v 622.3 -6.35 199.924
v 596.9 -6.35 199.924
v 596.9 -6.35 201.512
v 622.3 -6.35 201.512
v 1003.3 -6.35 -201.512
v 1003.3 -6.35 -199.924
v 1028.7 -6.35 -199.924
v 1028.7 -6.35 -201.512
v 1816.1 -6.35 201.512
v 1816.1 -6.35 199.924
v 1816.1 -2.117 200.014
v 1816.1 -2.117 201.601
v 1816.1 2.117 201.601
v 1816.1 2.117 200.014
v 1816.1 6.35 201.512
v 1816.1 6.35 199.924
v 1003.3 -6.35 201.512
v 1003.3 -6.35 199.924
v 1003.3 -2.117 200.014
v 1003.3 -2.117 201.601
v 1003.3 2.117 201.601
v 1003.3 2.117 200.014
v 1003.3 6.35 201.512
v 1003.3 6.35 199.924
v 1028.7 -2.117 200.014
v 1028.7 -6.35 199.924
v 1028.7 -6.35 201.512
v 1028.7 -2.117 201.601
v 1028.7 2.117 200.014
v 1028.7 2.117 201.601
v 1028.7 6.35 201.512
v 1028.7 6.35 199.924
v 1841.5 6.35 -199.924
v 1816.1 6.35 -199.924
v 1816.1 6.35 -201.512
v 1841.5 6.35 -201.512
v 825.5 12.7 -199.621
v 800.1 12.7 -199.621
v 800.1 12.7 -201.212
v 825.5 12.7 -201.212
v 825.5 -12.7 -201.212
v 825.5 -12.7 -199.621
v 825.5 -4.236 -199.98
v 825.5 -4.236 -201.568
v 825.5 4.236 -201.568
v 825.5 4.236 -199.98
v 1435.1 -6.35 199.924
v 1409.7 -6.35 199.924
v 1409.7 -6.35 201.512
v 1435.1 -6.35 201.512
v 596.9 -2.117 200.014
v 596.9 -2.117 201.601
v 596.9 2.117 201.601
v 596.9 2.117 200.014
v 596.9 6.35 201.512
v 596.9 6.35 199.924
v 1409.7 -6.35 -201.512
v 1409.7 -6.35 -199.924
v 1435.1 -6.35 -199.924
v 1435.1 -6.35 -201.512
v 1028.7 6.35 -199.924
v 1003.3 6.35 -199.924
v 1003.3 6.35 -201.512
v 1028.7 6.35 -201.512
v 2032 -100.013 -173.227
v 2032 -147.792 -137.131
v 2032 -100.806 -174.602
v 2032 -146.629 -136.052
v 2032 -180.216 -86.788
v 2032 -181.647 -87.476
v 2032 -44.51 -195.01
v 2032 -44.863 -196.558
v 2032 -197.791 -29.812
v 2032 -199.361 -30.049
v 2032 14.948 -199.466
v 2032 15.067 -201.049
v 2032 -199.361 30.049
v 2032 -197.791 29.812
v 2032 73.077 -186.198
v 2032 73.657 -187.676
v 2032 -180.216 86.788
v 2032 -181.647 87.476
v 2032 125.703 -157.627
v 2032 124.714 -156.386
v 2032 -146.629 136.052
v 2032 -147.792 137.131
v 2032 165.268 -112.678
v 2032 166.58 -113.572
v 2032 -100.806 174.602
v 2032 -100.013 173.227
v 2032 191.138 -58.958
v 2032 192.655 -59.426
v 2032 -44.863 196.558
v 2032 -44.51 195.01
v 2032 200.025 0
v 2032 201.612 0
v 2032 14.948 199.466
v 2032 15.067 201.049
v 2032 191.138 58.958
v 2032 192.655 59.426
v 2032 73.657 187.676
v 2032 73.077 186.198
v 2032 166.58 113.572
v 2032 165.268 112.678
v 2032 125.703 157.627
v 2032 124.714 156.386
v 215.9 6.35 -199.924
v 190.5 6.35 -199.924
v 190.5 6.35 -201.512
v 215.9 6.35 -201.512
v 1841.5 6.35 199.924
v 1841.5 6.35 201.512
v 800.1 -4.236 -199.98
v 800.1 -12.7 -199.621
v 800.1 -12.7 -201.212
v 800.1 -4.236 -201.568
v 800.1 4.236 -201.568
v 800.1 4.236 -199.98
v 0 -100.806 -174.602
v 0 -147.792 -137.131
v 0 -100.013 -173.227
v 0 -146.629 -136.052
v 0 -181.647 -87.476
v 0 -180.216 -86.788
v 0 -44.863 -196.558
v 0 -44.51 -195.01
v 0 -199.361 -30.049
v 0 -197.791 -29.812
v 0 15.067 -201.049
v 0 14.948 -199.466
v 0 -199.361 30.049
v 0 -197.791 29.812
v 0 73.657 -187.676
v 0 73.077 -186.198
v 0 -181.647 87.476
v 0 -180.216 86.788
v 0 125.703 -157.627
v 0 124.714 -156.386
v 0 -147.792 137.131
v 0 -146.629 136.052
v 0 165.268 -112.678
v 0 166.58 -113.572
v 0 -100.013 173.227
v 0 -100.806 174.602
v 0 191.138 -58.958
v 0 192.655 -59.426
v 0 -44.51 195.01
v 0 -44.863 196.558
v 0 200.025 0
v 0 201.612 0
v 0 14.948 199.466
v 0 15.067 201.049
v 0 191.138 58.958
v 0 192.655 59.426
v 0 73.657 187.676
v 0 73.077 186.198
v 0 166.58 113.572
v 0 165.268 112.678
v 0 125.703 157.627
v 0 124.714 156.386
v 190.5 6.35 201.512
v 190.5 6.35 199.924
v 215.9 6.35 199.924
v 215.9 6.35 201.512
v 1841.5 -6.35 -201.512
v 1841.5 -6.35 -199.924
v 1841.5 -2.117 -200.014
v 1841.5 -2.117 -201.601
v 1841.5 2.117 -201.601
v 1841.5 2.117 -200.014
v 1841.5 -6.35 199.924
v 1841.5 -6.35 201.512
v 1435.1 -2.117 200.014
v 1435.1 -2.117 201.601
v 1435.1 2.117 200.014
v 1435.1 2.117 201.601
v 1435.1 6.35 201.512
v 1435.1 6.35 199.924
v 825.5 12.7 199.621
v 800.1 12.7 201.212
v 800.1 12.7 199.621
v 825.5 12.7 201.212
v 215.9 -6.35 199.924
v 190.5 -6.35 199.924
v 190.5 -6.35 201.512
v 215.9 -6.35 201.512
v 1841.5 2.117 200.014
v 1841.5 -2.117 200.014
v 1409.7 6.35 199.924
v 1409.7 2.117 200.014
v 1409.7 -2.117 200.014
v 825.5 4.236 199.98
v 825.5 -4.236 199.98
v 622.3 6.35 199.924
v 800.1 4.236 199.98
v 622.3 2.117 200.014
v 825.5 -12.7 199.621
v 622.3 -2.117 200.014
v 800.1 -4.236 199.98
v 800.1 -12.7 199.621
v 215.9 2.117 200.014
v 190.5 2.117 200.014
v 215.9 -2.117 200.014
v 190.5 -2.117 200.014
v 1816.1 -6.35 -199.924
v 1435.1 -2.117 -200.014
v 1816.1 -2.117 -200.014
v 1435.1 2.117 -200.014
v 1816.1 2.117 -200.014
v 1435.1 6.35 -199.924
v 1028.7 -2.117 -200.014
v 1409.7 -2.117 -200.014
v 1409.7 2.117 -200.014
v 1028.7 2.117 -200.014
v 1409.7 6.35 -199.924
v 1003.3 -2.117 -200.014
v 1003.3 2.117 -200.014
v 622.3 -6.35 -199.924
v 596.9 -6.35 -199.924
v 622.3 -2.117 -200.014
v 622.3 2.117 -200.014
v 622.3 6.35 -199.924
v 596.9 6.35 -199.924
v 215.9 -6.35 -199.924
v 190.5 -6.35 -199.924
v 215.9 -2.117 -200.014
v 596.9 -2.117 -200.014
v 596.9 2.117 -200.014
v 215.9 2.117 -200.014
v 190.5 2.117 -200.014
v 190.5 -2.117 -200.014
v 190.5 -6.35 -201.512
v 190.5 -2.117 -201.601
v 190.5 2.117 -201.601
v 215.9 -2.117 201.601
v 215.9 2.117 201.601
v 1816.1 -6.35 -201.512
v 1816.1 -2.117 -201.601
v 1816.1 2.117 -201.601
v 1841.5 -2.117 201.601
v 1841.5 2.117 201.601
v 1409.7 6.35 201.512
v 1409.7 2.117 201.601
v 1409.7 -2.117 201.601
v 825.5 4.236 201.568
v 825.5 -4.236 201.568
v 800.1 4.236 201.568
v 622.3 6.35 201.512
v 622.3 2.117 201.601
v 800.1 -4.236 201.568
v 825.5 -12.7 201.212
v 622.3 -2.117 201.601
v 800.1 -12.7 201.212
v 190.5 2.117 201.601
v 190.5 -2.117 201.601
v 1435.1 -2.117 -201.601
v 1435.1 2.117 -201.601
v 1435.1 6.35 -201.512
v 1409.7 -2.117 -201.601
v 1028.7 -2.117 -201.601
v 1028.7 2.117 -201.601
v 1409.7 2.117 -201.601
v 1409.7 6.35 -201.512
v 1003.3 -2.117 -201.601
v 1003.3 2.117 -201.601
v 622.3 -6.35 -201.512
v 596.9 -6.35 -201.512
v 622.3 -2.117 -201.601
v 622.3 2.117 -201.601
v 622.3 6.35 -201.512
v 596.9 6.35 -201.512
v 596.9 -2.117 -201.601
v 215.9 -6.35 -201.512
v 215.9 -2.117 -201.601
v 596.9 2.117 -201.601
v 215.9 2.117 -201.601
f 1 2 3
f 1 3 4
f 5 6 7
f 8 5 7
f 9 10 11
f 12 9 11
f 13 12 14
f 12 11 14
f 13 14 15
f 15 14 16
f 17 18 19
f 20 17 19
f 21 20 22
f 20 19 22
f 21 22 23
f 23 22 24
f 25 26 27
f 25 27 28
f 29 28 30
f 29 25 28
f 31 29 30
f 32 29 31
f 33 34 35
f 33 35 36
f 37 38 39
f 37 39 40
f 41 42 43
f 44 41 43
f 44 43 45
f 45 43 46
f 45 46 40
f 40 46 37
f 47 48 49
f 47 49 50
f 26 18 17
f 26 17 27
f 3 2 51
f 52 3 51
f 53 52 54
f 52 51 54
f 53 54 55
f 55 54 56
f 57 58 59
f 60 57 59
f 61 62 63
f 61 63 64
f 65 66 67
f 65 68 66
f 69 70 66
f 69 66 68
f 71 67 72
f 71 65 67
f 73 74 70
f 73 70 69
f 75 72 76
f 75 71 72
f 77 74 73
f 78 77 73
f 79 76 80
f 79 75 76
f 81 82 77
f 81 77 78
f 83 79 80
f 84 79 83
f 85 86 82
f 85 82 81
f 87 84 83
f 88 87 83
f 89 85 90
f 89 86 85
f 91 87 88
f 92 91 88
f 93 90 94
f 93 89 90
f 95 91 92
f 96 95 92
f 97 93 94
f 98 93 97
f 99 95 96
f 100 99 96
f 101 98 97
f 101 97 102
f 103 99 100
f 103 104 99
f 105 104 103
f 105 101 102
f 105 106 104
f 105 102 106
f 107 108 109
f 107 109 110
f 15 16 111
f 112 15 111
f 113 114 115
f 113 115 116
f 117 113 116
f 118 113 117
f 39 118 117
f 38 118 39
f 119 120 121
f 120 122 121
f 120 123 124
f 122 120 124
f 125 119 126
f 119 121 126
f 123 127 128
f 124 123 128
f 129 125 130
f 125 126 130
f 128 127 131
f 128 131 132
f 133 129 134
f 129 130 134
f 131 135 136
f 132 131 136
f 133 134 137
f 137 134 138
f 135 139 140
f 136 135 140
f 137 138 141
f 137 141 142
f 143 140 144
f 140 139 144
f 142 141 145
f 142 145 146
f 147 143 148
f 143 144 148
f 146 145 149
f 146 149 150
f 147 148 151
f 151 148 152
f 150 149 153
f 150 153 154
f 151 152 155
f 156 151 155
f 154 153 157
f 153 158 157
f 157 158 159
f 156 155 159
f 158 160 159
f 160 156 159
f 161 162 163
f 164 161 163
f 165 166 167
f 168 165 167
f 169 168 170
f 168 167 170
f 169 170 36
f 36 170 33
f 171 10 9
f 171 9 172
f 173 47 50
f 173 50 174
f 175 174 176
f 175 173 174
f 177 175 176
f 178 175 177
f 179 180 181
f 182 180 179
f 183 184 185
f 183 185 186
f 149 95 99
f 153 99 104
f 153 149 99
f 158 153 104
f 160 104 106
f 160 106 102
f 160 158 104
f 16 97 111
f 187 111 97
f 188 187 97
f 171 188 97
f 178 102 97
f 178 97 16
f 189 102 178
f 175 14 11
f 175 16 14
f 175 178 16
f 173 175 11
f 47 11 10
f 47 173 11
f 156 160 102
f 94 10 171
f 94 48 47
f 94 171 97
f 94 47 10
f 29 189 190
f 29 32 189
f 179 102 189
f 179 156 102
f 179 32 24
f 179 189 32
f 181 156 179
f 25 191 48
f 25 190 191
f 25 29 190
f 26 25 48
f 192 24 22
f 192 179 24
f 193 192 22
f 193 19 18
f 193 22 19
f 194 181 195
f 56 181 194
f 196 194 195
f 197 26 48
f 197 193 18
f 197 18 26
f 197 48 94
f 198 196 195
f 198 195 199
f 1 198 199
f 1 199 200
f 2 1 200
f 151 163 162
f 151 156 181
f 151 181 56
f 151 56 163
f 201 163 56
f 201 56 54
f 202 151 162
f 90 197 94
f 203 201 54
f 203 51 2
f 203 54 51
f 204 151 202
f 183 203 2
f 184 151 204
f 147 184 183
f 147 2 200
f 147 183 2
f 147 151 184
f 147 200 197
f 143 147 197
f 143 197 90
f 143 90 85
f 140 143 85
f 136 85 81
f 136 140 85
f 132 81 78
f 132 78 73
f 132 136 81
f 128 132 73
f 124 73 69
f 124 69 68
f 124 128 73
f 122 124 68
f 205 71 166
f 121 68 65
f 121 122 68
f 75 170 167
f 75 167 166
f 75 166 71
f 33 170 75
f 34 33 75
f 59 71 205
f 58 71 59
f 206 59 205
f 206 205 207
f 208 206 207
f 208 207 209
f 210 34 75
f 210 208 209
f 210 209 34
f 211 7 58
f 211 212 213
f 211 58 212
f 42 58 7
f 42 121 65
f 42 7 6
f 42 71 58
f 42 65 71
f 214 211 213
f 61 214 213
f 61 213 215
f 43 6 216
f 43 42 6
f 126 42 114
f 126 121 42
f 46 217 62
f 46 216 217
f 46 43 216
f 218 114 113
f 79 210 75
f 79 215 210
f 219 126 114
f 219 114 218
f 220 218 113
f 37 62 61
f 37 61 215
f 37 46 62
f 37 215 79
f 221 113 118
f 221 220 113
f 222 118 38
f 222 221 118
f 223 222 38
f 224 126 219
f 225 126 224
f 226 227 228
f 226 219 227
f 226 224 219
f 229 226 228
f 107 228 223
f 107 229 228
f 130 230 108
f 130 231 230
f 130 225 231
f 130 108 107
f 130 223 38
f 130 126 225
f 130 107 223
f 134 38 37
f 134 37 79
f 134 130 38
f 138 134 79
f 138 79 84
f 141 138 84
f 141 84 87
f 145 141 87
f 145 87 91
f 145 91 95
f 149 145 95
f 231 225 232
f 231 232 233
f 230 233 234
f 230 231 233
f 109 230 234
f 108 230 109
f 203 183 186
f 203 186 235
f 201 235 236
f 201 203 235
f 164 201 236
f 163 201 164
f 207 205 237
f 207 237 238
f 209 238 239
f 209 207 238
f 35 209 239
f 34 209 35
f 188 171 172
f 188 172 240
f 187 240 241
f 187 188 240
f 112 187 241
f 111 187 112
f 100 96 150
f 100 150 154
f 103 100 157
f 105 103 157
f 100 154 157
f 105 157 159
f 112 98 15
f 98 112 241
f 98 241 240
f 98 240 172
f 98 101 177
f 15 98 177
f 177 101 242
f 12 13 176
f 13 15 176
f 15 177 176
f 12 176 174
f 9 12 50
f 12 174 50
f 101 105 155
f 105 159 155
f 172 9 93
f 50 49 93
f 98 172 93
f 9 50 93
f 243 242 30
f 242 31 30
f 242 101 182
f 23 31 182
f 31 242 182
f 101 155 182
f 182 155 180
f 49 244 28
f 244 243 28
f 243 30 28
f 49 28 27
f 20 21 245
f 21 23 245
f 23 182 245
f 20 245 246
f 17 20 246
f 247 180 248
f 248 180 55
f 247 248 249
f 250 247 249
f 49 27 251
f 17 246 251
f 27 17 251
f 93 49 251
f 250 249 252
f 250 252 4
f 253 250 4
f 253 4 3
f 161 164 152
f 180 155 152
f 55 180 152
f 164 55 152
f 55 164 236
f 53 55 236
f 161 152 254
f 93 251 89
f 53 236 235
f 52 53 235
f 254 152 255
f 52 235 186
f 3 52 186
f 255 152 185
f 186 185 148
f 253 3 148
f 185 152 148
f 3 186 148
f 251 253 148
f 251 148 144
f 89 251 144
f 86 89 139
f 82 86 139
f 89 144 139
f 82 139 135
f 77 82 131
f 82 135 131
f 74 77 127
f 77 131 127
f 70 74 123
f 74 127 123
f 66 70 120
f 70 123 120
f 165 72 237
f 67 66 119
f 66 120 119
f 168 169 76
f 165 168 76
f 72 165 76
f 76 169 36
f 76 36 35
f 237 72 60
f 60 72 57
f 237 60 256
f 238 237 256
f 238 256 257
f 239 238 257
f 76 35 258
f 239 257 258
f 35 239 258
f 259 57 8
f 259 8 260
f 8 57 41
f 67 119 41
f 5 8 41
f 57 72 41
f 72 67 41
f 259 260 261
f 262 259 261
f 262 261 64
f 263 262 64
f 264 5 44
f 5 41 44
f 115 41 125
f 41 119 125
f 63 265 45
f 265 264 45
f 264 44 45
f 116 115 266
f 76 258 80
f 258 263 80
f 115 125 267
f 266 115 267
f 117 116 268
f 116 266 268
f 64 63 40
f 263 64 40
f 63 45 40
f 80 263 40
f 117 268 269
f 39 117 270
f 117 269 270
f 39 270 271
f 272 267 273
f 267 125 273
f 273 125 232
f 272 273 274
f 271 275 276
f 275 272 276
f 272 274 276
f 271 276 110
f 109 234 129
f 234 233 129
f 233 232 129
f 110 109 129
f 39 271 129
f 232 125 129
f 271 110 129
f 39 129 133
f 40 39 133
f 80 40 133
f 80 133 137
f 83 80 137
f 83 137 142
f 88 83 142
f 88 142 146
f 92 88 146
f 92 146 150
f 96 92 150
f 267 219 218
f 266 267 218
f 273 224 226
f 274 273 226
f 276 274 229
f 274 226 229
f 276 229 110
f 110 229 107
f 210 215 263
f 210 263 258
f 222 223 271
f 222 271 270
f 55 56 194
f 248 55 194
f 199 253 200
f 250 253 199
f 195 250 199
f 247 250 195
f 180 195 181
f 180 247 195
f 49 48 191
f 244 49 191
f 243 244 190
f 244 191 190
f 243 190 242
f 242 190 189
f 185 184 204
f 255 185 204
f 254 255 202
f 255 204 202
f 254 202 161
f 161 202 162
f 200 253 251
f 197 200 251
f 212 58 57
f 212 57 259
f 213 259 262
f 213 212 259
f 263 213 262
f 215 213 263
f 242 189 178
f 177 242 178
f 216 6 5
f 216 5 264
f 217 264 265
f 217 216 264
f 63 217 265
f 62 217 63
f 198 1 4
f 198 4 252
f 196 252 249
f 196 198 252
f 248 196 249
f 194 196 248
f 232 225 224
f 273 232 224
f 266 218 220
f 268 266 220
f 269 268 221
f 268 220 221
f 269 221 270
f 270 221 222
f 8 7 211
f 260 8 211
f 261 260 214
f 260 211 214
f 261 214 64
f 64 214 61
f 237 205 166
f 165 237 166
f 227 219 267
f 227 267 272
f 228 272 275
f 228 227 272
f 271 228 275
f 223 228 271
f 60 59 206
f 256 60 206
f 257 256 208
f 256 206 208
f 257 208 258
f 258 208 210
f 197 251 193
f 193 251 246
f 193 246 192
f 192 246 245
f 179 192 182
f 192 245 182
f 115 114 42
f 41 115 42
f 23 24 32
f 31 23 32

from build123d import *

# Parameters (mm, degrees)
F0_R          = 201.6125
F0_R_2        = 200.025
F1_DEPTH      = 2032
F2_W          = 25.4
F2_H          = 25.4
F3_DEPTH      = 508
F4_DEPTH      = 2714
F4_DEPTH_BACK = 709.6135
F5_W          = 25.4
F5_H          = 12.7
F6_DEPTH      = 201.6135
F6_DEPTH_BACK = 201.6135


# Not quite as in the source:
# - an extrude ends at something that could not be found from the text; its depth is read off the source's solid


with BuildPart() as f1:
    # F0 (on Right) → F1 (new body)
    with BuildSketch(Plane.YZ):
        Circle(F0_R)
        Circle(F0_R_2, mode=Mode.SUBTRACT)
    extrude(amount=F1_DEPTH)


with BuildPart() as f3:
    # F2 (on Top) → F3 (new body)
    with BuildSketch(Plane.XY):
        with Locations((812.8, 0)):
            Rectangle(F2_W, F2_H)
    extrude(amount=F3_DEPTH)


with BuildPart() as f4_tool:
    # F4 (cut, two sides): a face of the model
    f4_faces = [f3.part.faces().sort_by_distance(p)[0] for p in [
        (812.8, 0, 508),
    ]]
    extrude(f4_faces, amount=F4_DEPTH)
    extrude(f4_faces, amount=-F4_DEPTH_BACK)


with BuildPart() as f1_1:
    add(f1.part)

    # F4: cut by f4_tool
    add(f4_tool.part, mode=Mode.SUBTRACT)

    # F5 (on Top) → F6 (cut, two sides)
    with BuildSketch(Plane.XY) as f6_sk:
        with Locations((203.2, 0)):
            Rectangle(F5_W, F5_H)
        with Locations((609.6, 0)):
            Rectangle(F5_W, F5_H)
        with Locations((1016, 0)):
            Rectangle(F5_W, F5_H)
        with Locations((1422.4, 0)):
            Rectangle(F5_W, F5_H)
        with Locations((1828.8, 0)):
            Rectangle(F5_W, F5_H)
    extrude(amount=F6_DEPTH, mode=Mode.SUBTRACT)
    extrude(f6_sk.sketch, amount=-F6_DEPTH_BACK, mode=Mode.SUBTRACT)


with BuildPart() as f3_1:
    add(f3.part)

    # F4: cut by f4_tool
    add(f4_tool.part, mode=Mode.SUBTRACT)


solid = f1_1.part
